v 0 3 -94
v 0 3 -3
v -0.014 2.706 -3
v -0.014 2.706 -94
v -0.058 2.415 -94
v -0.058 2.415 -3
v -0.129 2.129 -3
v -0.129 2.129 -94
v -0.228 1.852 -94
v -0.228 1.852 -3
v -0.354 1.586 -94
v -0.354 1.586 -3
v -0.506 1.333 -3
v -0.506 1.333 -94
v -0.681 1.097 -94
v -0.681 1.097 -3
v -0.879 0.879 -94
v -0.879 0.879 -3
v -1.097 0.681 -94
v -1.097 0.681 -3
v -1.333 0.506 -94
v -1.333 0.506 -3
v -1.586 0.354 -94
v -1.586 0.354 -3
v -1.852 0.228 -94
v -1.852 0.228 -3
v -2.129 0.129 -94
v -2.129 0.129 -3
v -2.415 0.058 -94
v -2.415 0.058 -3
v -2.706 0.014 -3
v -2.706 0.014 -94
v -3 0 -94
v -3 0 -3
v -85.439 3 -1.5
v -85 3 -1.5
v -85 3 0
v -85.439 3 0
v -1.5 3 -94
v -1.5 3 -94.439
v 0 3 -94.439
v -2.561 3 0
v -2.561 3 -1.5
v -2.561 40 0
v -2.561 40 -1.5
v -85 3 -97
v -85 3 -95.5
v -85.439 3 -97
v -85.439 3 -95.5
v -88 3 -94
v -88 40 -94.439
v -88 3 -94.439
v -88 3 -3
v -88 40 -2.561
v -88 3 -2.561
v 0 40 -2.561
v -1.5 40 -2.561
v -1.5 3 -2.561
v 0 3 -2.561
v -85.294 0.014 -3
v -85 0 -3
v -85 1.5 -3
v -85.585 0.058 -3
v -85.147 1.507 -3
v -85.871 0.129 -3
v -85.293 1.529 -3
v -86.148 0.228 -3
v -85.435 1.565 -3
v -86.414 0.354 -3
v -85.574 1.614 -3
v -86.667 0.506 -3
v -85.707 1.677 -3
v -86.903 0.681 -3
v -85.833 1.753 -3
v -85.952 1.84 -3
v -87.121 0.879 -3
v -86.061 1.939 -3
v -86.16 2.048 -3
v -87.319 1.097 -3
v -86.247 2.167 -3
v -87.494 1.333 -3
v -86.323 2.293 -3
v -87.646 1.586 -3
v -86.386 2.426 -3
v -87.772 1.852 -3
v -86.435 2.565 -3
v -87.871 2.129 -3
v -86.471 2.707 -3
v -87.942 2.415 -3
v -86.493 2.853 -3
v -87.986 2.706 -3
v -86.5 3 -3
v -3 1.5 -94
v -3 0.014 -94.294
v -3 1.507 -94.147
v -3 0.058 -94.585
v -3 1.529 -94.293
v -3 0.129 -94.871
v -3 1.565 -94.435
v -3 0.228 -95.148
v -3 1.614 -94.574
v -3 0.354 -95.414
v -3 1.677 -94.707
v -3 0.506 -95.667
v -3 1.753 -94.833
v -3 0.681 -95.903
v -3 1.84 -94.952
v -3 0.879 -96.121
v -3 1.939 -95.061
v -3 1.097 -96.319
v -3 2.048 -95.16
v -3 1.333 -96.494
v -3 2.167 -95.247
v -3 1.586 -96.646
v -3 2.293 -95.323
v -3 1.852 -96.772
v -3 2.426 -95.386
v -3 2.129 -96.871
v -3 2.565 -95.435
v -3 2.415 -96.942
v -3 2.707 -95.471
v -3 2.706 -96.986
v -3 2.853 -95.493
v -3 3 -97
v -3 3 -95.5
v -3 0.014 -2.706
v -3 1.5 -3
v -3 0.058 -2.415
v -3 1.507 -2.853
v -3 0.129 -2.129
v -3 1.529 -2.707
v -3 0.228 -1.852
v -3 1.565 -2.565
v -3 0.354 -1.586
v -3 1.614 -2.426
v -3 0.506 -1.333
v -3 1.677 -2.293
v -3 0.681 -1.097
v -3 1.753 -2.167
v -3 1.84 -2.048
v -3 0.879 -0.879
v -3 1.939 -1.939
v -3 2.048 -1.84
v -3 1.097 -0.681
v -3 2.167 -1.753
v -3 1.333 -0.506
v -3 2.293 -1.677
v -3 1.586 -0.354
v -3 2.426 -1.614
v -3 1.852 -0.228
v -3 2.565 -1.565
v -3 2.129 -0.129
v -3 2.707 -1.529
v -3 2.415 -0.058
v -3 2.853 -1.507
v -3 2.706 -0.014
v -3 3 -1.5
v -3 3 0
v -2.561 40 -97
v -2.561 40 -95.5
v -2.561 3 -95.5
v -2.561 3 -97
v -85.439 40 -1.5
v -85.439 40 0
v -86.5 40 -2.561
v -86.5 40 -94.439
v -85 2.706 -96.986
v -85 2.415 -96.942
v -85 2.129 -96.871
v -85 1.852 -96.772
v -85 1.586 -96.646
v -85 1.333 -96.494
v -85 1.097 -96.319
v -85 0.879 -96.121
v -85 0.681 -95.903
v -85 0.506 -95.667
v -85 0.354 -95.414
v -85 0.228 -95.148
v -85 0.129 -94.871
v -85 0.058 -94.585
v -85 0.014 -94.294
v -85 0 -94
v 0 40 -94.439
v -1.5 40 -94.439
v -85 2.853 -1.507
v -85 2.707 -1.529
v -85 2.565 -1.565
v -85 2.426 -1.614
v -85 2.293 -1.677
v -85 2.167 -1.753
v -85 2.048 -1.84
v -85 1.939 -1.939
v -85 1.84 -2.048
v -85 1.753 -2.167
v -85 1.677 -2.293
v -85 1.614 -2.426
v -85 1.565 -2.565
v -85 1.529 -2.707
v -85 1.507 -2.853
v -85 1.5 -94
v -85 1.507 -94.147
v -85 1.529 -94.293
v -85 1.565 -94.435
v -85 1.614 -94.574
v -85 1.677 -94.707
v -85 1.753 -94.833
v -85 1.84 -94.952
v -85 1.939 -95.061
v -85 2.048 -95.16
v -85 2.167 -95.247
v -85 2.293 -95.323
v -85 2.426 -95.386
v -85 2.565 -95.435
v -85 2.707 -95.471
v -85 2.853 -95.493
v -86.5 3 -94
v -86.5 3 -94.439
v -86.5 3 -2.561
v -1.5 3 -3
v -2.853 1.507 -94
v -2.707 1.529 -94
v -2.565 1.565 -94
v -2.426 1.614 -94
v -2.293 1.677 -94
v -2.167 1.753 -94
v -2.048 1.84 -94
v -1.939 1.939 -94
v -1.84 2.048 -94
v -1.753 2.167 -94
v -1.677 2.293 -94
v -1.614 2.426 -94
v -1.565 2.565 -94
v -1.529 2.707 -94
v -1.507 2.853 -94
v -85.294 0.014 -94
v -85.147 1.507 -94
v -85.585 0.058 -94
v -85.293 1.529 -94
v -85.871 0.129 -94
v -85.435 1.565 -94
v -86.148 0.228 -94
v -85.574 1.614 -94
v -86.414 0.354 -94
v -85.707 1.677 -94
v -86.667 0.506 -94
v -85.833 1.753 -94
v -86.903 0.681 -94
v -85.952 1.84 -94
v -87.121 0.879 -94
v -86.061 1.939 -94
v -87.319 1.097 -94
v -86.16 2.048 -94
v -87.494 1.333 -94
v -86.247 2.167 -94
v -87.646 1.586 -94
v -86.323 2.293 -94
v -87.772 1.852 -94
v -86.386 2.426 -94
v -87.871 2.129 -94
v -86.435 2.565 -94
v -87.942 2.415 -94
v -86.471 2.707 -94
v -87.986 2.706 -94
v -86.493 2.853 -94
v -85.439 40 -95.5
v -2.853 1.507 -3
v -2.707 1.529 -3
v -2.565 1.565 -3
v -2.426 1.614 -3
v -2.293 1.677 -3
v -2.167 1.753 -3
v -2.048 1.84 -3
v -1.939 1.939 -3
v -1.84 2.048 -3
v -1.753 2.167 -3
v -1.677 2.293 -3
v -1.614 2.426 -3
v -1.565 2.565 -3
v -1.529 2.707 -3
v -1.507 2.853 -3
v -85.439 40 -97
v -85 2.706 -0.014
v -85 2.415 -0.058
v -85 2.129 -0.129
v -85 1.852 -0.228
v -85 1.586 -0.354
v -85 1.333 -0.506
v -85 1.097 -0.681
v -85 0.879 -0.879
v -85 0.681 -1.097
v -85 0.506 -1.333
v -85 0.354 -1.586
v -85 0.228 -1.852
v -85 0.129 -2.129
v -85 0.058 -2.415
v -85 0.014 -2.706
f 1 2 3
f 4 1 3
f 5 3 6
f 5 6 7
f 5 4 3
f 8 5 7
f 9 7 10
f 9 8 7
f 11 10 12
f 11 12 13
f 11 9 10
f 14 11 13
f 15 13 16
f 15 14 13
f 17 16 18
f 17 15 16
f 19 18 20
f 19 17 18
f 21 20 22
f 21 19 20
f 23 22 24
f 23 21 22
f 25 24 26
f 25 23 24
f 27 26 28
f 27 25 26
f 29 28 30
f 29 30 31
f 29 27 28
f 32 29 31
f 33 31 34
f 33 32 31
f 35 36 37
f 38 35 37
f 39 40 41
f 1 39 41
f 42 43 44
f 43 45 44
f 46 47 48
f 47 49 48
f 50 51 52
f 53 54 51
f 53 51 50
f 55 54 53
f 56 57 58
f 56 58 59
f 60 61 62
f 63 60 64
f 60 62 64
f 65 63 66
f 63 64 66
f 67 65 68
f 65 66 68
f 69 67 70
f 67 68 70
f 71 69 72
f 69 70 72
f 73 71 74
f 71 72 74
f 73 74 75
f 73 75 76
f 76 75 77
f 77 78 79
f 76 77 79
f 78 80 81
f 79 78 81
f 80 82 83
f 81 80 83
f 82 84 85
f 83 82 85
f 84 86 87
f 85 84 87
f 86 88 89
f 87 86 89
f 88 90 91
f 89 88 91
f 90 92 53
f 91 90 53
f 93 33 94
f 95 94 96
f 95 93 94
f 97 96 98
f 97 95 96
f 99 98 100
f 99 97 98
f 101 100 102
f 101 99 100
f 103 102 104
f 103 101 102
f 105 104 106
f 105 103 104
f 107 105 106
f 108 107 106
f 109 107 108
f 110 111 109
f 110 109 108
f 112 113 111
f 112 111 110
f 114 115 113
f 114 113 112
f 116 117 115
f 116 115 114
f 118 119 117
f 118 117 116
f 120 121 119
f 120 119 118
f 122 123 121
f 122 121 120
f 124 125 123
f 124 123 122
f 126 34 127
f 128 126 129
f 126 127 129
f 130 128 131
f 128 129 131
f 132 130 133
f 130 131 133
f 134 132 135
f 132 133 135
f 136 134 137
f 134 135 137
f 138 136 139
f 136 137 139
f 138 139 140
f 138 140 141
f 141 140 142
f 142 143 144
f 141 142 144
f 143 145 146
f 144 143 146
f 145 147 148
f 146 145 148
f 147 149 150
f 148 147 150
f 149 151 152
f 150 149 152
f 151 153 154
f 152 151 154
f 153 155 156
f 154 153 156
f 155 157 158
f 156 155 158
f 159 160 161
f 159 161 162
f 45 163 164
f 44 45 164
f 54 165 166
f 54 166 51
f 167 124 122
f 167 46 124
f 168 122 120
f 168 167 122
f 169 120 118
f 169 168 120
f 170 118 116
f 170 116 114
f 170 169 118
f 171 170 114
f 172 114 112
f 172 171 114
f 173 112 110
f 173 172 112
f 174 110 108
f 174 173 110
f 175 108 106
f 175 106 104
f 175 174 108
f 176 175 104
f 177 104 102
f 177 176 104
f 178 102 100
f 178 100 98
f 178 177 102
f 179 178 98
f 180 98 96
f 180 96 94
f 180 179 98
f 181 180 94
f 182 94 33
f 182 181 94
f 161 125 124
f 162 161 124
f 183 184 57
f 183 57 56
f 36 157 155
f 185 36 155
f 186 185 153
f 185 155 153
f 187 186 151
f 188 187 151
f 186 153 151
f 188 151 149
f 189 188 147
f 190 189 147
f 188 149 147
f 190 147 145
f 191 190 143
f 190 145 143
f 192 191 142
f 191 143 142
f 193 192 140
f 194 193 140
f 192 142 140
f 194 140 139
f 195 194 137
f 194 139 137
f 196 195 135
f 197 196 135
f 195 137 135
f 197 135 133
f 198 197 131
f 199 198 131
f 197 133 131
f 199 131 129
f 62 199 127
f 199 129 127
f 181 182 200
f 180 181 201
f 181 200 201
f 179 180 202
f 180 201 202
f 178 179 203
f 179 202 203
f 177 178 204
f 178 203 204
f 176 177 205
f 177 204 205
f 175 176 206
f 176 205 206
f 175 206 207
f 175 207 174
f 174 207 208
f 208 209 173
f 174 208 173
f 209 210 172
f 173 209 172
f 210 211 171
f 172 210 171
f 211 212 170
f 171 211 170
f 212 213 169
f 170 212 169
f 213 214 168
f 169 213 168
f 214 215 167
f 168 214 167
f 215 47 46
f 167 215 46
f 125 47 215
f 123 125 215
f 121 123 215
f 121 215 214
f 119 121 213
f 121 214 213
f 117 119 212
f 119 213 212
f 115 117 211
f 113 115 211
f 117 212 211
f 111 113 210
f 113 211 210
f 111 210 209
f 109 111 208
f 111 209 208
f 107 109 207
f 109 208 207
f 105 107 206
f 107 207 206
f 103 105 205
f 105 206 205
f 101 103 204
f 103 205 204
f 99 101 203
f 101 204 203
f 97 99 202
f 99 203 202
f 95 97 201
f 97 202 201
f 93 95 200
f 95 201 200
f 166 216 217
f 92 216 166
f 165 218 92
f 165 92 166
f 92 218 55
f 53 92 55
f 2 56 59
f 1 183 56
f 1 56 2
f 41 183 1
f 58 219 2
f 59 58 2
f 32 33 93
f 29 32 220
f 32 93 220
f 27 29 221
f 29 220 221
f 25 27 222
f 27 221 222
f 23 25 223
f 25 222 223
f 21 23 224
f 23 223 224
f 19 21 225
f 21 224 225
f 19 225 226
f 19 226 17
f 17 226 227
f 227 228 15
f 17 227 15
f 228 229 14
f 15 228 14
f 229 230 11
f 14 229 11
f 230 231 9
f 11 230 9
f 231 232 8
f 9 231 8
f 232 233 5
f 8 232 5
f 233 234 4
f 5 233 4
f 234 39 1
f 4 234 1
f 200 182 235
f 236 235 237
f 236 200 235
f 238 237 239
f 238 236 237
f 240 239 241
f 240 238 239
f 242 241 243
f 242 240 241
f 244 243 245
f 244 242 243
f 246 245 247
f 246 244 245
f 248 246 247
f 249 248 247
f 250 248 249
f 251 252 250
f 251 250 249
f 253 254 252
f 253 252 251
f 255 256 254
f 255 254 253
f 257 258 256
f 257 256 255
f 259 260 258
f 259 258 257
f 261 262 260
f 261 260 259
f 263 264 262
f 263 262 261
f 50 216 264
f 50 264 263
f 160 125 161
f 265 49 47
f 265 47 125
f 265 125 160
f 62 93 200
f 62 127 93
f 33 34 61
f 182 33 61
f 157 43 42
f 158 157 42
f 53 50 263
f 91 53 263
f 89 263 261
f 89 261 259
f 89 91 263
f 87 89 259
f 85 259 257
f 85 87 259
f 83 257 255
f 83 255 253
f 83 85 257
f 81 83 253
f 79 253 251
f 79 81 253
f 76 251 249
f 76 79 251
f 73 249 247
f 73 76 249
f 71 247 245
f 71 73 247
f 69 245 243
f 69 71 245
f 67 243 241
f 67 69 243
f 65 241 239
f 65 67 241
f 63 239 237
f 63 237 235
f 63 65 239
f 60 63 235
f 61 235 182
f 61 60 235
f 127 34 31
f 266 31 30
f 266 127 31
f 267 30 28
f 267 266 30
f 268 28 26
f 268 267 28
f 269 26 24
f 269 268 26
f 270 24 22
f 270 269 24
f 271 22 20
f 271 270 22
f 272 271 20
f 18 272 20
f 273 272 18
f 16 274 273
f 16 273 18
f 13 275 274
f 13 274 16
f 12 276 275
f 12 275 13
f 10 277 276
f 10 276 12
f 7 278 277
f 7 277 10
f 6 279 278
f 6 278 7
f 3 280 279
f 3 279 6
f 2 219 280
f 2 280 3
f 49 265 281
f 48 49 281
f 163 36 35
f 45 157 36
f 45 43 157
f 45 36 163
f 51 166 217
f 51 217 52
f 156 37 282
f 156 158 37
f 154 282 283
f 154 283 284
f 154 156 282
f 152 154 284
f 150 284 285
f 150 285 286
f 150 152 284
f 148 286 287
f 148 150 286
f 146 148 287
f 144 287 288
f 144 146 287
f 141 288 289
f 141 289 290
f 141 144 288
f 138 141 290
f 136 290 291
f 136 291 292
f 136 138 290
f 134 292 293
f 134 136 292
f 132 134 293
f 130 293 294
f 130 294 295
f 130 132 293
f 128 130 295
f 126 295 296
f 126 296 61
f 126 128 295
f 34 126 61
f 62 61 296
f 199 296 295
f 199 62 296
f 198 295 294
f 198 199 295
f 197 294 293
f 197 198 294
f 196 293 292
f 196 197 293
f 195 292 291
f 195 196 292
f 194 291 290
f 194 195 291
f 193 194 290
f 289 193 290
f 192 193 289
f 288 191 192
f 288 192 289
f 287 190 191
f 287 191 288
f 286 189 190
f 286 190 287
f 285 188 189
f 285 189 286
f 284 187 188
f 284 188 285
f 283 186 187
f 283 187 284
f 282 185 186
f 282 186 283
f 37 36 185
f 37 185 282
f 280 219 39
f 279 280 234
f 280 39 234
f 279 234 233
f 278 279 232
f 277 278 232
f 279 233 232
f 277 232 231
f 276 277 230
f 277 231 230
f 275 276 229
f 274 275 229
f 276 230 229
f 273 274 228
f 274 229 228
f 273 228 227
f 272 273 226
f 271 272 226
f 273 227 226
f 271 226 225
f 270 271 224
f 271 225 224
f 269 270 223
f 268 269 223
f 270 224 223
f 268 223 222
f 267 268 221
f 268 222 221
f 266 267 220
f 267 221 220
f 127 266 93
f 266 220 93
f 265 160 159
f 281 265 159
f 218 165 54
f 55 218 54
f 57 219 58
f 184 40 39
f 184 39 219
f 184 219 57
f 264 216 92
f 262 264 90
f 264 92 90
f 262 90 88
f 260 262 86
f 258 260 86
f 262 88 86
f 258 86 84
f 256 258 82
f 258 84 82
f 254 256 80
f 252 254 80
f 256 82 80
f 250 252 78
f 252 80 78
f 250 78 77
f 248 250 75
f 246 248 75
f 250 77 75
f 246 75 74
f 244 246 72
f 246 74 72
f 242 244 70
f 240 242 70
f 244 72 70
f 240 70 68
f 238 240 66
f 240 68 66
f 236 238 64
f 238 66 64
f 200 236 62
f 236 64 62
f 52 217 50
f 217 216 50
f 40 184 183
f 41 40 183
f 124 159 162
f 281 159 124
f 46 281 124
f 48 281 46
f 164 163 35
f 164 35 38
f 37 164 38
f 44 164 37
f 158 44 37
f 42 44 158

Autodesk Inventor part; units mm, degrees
ref_plane "YZ Plane" through (0, 0, 0) normal (1, 0, 0) x (0, 1, 0)
ref_plane "XZ Plane" through (0, 0, 0) normal (0, 1, 0) x (-1, 0, 0)
ref_plane "XY Plane" through (0, 0, 0) normal (0, 0, 1) x (1, 0, 0)
sketch "Sketch1" plane through (0, 0, 0) normal (0, 1, 0) x (-1, 0, 0)
  line L0 (0, 0) -> (88, 0)
  line L1 (88, 0) -> (88, -97)
  line L2 (88, -97) -> (0, -97)
  line L3 (0, -97) -> (0, 0)
  dimension "d0" = 97
  dimension "d1" = 88
extrude "Plate1" add sketch "Sketch1" along normal blind 1.5
sketch "Sketch2" plane through (-86.5, 0, 0) normal (-1, 0, 0) x (0, -1, 0)
  line L0 (0, -97) -> (0, 0)
  line L1 (0, 0) -> (-40, 0)
  line L2 (-40, 0) -> (-40, -97)
  line L3 (-40, -97) -> (0, -97)
edge flange "Flange1" height 40 angle 90 thickness 1.5 bend radius 1.5 thickness toward (-1, 0, 0) relief tear relief width 1.5 relief depth 0.75 corner gap 1.5 corner form 2 edges at (-88, 1.5, -48.5) (-44, 1.5, 0) (0, 1.5, -48.5) (-44, 1.5, -97) wall of the first edge with corners at (-86.5, 0, -97) (-86.5, 0, 0) (-86.5, 40, 0) (-86.5, 40, -97)
bend "Bend1"
corner "Corner1"
equation "\"d2\" = Thickness"
equation "\"d3\" = BendReliefWidth"
equation "\"d4\" = BendReliefDepth"
equation "\"d5\" = MinimumRemnant"
equation "\"d6\" = TransitionRadius"
equation "\"d9\" = BendRadius"
equation "\"d10\" = CornerReliefSize"
equation "\"d11\" = GapSize"
equation "\"d12\" = JacobiRadiusSize"
equation "\"BendRadius\" = Thickness"
equation "\"BendReliefWidth\" = Thickness"
equation "\"BendReliefDepth\" = 0.5 * Thickness"
equation "\"CornerReliefSize\" = 4 * Thickness"
equation "\"MinimumRemnant\" = 2 * Thickness"
equation "\"TransitionRadius\" = BendRadius"
equation "\"JacobiRadiusSize\" = BendRadius"
equation "\"GapSize\" = Thickness"
equation "\"Thickness\" = 1.5"
